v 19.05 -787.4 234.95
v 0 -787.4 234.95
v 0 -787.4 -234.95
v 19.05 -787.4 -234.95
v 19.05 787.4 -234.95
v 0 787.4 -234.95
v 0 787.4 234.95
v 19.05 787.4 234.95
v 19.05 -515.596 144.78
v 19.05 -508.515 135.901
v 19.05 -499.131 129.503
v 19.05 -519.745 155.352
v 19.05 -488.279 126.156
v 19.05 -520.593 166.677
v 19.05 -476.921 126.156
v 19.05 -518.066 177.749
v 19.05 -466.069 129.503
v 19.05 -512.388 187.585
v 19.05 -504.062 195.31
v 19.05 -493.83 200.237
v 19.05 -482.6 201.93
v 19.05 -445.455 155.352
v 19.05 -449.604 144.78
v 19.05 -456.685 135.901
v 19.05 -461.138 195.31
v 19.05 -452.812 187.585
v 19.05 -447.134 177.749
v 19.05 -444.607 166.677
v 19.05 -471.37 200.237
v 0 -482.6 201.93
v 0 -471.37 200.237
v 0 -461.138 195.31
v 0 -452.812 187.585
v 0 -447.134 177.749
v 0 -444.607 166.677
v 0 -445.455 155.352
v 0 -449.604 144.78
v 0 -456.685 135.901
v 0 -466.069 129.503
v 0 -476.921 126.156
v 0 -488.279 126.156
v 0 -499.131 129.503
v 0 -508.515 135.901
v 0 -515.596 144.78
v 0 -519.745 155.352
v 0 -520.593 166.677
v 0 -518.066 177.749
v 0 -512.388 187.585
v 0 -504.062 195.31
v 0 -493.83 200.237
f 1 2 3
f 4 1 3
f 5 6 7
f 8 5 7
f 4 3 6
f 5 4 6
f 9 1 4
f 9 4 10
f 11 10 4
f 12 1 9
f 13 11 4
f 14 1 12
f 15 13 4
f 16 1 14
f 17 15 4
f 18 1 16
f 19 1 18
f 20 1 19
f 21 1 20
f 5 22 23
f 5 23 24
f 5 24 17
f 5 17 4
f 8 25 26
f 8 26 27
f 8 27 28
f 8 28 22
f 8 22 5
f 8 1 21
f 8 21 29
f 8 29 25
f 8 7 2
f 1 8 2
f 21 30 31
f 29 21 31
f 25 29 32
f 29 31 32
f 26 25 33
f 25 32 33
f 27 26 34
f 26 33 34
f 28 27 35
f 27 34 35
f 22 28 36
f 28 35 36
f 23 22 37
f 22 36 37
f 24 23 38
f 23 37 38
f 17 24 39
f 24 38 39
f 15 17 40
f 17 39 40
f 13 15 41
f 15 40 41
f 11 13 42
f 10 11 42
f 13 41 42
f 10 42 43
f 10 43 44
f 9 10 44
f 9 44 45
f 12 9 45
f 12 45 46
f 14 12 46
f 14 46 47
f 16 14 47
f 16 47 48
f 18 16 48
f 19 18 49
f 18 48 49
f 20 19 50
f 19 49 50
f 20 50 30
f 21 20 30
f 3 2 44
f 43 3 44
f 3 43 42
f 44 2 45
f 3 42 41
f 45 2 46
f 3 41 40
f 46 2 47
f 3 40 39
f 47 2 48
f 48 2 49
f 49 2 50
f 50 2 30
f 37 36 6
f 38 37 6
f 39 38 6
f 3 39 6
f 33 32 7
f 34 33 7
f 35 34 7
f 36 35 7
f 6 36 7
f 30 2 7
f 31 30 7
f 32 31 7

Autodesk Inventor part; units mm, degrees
ref_plane "YZ Plane" through (0, 0, 0) normal (1, 0, 0) x (0, 1, 0)
ref_plane "XZ Plane" through (0, 0, 0) normal (0, 1, 0) x (-1, 0, 0)
ref_plane "XY Plane" through (0, 0, 0) normal (0, 0, 1) x (1, 0, 0)
sketch "Sketch1" plane through (0, 0, 0) normal (1, 0, 0) x (0, 1, 0)
  line L0 (-787.4, -234.95) -> (787.4, -234.95)
  line L1 (787.4, -234.95) -> (787.4, 234.95)
  line L2 (787.4, 234.95) -> (-787.4, 234.95)
  line L3 (-787.4, 234.95) -> (-787.4, -234.95)
  line L4 (-787.4, -234.95) -> (787.4, 234.95) construction
  line L5 (787.4, -234.95) -> (-787.4, 234.95) construction
  point P0 (0, 0)
  dimension "d0" = 1574.8
  dimension "d1" = 469.9
extrude "Extrusion1" add sketch "Sketch1" along normal blind 19.05
sketch "Sketch2" plane through (0, 0, 0) normal (-1, 0, 0) x (0, 0, 1)
  circle A0 centre (163.83, -482.6) radius 38.1
  line L0 (234.95, 787.4) -> (234.95, -787.4) projected
  line L1 (234.95, -787.4) -> (-234.95, -787.4) projected
  point P0 (0, 0)
  point P1 (0, 0)
  dimension "d5" = 76.2
  dimension "d8" = 71.12
  dimension "d9" = 304.8
extrude "Extrusion2" cut sketch "Sketch2" against normal blind 25.4
properties part number "back board (for assembly)"
